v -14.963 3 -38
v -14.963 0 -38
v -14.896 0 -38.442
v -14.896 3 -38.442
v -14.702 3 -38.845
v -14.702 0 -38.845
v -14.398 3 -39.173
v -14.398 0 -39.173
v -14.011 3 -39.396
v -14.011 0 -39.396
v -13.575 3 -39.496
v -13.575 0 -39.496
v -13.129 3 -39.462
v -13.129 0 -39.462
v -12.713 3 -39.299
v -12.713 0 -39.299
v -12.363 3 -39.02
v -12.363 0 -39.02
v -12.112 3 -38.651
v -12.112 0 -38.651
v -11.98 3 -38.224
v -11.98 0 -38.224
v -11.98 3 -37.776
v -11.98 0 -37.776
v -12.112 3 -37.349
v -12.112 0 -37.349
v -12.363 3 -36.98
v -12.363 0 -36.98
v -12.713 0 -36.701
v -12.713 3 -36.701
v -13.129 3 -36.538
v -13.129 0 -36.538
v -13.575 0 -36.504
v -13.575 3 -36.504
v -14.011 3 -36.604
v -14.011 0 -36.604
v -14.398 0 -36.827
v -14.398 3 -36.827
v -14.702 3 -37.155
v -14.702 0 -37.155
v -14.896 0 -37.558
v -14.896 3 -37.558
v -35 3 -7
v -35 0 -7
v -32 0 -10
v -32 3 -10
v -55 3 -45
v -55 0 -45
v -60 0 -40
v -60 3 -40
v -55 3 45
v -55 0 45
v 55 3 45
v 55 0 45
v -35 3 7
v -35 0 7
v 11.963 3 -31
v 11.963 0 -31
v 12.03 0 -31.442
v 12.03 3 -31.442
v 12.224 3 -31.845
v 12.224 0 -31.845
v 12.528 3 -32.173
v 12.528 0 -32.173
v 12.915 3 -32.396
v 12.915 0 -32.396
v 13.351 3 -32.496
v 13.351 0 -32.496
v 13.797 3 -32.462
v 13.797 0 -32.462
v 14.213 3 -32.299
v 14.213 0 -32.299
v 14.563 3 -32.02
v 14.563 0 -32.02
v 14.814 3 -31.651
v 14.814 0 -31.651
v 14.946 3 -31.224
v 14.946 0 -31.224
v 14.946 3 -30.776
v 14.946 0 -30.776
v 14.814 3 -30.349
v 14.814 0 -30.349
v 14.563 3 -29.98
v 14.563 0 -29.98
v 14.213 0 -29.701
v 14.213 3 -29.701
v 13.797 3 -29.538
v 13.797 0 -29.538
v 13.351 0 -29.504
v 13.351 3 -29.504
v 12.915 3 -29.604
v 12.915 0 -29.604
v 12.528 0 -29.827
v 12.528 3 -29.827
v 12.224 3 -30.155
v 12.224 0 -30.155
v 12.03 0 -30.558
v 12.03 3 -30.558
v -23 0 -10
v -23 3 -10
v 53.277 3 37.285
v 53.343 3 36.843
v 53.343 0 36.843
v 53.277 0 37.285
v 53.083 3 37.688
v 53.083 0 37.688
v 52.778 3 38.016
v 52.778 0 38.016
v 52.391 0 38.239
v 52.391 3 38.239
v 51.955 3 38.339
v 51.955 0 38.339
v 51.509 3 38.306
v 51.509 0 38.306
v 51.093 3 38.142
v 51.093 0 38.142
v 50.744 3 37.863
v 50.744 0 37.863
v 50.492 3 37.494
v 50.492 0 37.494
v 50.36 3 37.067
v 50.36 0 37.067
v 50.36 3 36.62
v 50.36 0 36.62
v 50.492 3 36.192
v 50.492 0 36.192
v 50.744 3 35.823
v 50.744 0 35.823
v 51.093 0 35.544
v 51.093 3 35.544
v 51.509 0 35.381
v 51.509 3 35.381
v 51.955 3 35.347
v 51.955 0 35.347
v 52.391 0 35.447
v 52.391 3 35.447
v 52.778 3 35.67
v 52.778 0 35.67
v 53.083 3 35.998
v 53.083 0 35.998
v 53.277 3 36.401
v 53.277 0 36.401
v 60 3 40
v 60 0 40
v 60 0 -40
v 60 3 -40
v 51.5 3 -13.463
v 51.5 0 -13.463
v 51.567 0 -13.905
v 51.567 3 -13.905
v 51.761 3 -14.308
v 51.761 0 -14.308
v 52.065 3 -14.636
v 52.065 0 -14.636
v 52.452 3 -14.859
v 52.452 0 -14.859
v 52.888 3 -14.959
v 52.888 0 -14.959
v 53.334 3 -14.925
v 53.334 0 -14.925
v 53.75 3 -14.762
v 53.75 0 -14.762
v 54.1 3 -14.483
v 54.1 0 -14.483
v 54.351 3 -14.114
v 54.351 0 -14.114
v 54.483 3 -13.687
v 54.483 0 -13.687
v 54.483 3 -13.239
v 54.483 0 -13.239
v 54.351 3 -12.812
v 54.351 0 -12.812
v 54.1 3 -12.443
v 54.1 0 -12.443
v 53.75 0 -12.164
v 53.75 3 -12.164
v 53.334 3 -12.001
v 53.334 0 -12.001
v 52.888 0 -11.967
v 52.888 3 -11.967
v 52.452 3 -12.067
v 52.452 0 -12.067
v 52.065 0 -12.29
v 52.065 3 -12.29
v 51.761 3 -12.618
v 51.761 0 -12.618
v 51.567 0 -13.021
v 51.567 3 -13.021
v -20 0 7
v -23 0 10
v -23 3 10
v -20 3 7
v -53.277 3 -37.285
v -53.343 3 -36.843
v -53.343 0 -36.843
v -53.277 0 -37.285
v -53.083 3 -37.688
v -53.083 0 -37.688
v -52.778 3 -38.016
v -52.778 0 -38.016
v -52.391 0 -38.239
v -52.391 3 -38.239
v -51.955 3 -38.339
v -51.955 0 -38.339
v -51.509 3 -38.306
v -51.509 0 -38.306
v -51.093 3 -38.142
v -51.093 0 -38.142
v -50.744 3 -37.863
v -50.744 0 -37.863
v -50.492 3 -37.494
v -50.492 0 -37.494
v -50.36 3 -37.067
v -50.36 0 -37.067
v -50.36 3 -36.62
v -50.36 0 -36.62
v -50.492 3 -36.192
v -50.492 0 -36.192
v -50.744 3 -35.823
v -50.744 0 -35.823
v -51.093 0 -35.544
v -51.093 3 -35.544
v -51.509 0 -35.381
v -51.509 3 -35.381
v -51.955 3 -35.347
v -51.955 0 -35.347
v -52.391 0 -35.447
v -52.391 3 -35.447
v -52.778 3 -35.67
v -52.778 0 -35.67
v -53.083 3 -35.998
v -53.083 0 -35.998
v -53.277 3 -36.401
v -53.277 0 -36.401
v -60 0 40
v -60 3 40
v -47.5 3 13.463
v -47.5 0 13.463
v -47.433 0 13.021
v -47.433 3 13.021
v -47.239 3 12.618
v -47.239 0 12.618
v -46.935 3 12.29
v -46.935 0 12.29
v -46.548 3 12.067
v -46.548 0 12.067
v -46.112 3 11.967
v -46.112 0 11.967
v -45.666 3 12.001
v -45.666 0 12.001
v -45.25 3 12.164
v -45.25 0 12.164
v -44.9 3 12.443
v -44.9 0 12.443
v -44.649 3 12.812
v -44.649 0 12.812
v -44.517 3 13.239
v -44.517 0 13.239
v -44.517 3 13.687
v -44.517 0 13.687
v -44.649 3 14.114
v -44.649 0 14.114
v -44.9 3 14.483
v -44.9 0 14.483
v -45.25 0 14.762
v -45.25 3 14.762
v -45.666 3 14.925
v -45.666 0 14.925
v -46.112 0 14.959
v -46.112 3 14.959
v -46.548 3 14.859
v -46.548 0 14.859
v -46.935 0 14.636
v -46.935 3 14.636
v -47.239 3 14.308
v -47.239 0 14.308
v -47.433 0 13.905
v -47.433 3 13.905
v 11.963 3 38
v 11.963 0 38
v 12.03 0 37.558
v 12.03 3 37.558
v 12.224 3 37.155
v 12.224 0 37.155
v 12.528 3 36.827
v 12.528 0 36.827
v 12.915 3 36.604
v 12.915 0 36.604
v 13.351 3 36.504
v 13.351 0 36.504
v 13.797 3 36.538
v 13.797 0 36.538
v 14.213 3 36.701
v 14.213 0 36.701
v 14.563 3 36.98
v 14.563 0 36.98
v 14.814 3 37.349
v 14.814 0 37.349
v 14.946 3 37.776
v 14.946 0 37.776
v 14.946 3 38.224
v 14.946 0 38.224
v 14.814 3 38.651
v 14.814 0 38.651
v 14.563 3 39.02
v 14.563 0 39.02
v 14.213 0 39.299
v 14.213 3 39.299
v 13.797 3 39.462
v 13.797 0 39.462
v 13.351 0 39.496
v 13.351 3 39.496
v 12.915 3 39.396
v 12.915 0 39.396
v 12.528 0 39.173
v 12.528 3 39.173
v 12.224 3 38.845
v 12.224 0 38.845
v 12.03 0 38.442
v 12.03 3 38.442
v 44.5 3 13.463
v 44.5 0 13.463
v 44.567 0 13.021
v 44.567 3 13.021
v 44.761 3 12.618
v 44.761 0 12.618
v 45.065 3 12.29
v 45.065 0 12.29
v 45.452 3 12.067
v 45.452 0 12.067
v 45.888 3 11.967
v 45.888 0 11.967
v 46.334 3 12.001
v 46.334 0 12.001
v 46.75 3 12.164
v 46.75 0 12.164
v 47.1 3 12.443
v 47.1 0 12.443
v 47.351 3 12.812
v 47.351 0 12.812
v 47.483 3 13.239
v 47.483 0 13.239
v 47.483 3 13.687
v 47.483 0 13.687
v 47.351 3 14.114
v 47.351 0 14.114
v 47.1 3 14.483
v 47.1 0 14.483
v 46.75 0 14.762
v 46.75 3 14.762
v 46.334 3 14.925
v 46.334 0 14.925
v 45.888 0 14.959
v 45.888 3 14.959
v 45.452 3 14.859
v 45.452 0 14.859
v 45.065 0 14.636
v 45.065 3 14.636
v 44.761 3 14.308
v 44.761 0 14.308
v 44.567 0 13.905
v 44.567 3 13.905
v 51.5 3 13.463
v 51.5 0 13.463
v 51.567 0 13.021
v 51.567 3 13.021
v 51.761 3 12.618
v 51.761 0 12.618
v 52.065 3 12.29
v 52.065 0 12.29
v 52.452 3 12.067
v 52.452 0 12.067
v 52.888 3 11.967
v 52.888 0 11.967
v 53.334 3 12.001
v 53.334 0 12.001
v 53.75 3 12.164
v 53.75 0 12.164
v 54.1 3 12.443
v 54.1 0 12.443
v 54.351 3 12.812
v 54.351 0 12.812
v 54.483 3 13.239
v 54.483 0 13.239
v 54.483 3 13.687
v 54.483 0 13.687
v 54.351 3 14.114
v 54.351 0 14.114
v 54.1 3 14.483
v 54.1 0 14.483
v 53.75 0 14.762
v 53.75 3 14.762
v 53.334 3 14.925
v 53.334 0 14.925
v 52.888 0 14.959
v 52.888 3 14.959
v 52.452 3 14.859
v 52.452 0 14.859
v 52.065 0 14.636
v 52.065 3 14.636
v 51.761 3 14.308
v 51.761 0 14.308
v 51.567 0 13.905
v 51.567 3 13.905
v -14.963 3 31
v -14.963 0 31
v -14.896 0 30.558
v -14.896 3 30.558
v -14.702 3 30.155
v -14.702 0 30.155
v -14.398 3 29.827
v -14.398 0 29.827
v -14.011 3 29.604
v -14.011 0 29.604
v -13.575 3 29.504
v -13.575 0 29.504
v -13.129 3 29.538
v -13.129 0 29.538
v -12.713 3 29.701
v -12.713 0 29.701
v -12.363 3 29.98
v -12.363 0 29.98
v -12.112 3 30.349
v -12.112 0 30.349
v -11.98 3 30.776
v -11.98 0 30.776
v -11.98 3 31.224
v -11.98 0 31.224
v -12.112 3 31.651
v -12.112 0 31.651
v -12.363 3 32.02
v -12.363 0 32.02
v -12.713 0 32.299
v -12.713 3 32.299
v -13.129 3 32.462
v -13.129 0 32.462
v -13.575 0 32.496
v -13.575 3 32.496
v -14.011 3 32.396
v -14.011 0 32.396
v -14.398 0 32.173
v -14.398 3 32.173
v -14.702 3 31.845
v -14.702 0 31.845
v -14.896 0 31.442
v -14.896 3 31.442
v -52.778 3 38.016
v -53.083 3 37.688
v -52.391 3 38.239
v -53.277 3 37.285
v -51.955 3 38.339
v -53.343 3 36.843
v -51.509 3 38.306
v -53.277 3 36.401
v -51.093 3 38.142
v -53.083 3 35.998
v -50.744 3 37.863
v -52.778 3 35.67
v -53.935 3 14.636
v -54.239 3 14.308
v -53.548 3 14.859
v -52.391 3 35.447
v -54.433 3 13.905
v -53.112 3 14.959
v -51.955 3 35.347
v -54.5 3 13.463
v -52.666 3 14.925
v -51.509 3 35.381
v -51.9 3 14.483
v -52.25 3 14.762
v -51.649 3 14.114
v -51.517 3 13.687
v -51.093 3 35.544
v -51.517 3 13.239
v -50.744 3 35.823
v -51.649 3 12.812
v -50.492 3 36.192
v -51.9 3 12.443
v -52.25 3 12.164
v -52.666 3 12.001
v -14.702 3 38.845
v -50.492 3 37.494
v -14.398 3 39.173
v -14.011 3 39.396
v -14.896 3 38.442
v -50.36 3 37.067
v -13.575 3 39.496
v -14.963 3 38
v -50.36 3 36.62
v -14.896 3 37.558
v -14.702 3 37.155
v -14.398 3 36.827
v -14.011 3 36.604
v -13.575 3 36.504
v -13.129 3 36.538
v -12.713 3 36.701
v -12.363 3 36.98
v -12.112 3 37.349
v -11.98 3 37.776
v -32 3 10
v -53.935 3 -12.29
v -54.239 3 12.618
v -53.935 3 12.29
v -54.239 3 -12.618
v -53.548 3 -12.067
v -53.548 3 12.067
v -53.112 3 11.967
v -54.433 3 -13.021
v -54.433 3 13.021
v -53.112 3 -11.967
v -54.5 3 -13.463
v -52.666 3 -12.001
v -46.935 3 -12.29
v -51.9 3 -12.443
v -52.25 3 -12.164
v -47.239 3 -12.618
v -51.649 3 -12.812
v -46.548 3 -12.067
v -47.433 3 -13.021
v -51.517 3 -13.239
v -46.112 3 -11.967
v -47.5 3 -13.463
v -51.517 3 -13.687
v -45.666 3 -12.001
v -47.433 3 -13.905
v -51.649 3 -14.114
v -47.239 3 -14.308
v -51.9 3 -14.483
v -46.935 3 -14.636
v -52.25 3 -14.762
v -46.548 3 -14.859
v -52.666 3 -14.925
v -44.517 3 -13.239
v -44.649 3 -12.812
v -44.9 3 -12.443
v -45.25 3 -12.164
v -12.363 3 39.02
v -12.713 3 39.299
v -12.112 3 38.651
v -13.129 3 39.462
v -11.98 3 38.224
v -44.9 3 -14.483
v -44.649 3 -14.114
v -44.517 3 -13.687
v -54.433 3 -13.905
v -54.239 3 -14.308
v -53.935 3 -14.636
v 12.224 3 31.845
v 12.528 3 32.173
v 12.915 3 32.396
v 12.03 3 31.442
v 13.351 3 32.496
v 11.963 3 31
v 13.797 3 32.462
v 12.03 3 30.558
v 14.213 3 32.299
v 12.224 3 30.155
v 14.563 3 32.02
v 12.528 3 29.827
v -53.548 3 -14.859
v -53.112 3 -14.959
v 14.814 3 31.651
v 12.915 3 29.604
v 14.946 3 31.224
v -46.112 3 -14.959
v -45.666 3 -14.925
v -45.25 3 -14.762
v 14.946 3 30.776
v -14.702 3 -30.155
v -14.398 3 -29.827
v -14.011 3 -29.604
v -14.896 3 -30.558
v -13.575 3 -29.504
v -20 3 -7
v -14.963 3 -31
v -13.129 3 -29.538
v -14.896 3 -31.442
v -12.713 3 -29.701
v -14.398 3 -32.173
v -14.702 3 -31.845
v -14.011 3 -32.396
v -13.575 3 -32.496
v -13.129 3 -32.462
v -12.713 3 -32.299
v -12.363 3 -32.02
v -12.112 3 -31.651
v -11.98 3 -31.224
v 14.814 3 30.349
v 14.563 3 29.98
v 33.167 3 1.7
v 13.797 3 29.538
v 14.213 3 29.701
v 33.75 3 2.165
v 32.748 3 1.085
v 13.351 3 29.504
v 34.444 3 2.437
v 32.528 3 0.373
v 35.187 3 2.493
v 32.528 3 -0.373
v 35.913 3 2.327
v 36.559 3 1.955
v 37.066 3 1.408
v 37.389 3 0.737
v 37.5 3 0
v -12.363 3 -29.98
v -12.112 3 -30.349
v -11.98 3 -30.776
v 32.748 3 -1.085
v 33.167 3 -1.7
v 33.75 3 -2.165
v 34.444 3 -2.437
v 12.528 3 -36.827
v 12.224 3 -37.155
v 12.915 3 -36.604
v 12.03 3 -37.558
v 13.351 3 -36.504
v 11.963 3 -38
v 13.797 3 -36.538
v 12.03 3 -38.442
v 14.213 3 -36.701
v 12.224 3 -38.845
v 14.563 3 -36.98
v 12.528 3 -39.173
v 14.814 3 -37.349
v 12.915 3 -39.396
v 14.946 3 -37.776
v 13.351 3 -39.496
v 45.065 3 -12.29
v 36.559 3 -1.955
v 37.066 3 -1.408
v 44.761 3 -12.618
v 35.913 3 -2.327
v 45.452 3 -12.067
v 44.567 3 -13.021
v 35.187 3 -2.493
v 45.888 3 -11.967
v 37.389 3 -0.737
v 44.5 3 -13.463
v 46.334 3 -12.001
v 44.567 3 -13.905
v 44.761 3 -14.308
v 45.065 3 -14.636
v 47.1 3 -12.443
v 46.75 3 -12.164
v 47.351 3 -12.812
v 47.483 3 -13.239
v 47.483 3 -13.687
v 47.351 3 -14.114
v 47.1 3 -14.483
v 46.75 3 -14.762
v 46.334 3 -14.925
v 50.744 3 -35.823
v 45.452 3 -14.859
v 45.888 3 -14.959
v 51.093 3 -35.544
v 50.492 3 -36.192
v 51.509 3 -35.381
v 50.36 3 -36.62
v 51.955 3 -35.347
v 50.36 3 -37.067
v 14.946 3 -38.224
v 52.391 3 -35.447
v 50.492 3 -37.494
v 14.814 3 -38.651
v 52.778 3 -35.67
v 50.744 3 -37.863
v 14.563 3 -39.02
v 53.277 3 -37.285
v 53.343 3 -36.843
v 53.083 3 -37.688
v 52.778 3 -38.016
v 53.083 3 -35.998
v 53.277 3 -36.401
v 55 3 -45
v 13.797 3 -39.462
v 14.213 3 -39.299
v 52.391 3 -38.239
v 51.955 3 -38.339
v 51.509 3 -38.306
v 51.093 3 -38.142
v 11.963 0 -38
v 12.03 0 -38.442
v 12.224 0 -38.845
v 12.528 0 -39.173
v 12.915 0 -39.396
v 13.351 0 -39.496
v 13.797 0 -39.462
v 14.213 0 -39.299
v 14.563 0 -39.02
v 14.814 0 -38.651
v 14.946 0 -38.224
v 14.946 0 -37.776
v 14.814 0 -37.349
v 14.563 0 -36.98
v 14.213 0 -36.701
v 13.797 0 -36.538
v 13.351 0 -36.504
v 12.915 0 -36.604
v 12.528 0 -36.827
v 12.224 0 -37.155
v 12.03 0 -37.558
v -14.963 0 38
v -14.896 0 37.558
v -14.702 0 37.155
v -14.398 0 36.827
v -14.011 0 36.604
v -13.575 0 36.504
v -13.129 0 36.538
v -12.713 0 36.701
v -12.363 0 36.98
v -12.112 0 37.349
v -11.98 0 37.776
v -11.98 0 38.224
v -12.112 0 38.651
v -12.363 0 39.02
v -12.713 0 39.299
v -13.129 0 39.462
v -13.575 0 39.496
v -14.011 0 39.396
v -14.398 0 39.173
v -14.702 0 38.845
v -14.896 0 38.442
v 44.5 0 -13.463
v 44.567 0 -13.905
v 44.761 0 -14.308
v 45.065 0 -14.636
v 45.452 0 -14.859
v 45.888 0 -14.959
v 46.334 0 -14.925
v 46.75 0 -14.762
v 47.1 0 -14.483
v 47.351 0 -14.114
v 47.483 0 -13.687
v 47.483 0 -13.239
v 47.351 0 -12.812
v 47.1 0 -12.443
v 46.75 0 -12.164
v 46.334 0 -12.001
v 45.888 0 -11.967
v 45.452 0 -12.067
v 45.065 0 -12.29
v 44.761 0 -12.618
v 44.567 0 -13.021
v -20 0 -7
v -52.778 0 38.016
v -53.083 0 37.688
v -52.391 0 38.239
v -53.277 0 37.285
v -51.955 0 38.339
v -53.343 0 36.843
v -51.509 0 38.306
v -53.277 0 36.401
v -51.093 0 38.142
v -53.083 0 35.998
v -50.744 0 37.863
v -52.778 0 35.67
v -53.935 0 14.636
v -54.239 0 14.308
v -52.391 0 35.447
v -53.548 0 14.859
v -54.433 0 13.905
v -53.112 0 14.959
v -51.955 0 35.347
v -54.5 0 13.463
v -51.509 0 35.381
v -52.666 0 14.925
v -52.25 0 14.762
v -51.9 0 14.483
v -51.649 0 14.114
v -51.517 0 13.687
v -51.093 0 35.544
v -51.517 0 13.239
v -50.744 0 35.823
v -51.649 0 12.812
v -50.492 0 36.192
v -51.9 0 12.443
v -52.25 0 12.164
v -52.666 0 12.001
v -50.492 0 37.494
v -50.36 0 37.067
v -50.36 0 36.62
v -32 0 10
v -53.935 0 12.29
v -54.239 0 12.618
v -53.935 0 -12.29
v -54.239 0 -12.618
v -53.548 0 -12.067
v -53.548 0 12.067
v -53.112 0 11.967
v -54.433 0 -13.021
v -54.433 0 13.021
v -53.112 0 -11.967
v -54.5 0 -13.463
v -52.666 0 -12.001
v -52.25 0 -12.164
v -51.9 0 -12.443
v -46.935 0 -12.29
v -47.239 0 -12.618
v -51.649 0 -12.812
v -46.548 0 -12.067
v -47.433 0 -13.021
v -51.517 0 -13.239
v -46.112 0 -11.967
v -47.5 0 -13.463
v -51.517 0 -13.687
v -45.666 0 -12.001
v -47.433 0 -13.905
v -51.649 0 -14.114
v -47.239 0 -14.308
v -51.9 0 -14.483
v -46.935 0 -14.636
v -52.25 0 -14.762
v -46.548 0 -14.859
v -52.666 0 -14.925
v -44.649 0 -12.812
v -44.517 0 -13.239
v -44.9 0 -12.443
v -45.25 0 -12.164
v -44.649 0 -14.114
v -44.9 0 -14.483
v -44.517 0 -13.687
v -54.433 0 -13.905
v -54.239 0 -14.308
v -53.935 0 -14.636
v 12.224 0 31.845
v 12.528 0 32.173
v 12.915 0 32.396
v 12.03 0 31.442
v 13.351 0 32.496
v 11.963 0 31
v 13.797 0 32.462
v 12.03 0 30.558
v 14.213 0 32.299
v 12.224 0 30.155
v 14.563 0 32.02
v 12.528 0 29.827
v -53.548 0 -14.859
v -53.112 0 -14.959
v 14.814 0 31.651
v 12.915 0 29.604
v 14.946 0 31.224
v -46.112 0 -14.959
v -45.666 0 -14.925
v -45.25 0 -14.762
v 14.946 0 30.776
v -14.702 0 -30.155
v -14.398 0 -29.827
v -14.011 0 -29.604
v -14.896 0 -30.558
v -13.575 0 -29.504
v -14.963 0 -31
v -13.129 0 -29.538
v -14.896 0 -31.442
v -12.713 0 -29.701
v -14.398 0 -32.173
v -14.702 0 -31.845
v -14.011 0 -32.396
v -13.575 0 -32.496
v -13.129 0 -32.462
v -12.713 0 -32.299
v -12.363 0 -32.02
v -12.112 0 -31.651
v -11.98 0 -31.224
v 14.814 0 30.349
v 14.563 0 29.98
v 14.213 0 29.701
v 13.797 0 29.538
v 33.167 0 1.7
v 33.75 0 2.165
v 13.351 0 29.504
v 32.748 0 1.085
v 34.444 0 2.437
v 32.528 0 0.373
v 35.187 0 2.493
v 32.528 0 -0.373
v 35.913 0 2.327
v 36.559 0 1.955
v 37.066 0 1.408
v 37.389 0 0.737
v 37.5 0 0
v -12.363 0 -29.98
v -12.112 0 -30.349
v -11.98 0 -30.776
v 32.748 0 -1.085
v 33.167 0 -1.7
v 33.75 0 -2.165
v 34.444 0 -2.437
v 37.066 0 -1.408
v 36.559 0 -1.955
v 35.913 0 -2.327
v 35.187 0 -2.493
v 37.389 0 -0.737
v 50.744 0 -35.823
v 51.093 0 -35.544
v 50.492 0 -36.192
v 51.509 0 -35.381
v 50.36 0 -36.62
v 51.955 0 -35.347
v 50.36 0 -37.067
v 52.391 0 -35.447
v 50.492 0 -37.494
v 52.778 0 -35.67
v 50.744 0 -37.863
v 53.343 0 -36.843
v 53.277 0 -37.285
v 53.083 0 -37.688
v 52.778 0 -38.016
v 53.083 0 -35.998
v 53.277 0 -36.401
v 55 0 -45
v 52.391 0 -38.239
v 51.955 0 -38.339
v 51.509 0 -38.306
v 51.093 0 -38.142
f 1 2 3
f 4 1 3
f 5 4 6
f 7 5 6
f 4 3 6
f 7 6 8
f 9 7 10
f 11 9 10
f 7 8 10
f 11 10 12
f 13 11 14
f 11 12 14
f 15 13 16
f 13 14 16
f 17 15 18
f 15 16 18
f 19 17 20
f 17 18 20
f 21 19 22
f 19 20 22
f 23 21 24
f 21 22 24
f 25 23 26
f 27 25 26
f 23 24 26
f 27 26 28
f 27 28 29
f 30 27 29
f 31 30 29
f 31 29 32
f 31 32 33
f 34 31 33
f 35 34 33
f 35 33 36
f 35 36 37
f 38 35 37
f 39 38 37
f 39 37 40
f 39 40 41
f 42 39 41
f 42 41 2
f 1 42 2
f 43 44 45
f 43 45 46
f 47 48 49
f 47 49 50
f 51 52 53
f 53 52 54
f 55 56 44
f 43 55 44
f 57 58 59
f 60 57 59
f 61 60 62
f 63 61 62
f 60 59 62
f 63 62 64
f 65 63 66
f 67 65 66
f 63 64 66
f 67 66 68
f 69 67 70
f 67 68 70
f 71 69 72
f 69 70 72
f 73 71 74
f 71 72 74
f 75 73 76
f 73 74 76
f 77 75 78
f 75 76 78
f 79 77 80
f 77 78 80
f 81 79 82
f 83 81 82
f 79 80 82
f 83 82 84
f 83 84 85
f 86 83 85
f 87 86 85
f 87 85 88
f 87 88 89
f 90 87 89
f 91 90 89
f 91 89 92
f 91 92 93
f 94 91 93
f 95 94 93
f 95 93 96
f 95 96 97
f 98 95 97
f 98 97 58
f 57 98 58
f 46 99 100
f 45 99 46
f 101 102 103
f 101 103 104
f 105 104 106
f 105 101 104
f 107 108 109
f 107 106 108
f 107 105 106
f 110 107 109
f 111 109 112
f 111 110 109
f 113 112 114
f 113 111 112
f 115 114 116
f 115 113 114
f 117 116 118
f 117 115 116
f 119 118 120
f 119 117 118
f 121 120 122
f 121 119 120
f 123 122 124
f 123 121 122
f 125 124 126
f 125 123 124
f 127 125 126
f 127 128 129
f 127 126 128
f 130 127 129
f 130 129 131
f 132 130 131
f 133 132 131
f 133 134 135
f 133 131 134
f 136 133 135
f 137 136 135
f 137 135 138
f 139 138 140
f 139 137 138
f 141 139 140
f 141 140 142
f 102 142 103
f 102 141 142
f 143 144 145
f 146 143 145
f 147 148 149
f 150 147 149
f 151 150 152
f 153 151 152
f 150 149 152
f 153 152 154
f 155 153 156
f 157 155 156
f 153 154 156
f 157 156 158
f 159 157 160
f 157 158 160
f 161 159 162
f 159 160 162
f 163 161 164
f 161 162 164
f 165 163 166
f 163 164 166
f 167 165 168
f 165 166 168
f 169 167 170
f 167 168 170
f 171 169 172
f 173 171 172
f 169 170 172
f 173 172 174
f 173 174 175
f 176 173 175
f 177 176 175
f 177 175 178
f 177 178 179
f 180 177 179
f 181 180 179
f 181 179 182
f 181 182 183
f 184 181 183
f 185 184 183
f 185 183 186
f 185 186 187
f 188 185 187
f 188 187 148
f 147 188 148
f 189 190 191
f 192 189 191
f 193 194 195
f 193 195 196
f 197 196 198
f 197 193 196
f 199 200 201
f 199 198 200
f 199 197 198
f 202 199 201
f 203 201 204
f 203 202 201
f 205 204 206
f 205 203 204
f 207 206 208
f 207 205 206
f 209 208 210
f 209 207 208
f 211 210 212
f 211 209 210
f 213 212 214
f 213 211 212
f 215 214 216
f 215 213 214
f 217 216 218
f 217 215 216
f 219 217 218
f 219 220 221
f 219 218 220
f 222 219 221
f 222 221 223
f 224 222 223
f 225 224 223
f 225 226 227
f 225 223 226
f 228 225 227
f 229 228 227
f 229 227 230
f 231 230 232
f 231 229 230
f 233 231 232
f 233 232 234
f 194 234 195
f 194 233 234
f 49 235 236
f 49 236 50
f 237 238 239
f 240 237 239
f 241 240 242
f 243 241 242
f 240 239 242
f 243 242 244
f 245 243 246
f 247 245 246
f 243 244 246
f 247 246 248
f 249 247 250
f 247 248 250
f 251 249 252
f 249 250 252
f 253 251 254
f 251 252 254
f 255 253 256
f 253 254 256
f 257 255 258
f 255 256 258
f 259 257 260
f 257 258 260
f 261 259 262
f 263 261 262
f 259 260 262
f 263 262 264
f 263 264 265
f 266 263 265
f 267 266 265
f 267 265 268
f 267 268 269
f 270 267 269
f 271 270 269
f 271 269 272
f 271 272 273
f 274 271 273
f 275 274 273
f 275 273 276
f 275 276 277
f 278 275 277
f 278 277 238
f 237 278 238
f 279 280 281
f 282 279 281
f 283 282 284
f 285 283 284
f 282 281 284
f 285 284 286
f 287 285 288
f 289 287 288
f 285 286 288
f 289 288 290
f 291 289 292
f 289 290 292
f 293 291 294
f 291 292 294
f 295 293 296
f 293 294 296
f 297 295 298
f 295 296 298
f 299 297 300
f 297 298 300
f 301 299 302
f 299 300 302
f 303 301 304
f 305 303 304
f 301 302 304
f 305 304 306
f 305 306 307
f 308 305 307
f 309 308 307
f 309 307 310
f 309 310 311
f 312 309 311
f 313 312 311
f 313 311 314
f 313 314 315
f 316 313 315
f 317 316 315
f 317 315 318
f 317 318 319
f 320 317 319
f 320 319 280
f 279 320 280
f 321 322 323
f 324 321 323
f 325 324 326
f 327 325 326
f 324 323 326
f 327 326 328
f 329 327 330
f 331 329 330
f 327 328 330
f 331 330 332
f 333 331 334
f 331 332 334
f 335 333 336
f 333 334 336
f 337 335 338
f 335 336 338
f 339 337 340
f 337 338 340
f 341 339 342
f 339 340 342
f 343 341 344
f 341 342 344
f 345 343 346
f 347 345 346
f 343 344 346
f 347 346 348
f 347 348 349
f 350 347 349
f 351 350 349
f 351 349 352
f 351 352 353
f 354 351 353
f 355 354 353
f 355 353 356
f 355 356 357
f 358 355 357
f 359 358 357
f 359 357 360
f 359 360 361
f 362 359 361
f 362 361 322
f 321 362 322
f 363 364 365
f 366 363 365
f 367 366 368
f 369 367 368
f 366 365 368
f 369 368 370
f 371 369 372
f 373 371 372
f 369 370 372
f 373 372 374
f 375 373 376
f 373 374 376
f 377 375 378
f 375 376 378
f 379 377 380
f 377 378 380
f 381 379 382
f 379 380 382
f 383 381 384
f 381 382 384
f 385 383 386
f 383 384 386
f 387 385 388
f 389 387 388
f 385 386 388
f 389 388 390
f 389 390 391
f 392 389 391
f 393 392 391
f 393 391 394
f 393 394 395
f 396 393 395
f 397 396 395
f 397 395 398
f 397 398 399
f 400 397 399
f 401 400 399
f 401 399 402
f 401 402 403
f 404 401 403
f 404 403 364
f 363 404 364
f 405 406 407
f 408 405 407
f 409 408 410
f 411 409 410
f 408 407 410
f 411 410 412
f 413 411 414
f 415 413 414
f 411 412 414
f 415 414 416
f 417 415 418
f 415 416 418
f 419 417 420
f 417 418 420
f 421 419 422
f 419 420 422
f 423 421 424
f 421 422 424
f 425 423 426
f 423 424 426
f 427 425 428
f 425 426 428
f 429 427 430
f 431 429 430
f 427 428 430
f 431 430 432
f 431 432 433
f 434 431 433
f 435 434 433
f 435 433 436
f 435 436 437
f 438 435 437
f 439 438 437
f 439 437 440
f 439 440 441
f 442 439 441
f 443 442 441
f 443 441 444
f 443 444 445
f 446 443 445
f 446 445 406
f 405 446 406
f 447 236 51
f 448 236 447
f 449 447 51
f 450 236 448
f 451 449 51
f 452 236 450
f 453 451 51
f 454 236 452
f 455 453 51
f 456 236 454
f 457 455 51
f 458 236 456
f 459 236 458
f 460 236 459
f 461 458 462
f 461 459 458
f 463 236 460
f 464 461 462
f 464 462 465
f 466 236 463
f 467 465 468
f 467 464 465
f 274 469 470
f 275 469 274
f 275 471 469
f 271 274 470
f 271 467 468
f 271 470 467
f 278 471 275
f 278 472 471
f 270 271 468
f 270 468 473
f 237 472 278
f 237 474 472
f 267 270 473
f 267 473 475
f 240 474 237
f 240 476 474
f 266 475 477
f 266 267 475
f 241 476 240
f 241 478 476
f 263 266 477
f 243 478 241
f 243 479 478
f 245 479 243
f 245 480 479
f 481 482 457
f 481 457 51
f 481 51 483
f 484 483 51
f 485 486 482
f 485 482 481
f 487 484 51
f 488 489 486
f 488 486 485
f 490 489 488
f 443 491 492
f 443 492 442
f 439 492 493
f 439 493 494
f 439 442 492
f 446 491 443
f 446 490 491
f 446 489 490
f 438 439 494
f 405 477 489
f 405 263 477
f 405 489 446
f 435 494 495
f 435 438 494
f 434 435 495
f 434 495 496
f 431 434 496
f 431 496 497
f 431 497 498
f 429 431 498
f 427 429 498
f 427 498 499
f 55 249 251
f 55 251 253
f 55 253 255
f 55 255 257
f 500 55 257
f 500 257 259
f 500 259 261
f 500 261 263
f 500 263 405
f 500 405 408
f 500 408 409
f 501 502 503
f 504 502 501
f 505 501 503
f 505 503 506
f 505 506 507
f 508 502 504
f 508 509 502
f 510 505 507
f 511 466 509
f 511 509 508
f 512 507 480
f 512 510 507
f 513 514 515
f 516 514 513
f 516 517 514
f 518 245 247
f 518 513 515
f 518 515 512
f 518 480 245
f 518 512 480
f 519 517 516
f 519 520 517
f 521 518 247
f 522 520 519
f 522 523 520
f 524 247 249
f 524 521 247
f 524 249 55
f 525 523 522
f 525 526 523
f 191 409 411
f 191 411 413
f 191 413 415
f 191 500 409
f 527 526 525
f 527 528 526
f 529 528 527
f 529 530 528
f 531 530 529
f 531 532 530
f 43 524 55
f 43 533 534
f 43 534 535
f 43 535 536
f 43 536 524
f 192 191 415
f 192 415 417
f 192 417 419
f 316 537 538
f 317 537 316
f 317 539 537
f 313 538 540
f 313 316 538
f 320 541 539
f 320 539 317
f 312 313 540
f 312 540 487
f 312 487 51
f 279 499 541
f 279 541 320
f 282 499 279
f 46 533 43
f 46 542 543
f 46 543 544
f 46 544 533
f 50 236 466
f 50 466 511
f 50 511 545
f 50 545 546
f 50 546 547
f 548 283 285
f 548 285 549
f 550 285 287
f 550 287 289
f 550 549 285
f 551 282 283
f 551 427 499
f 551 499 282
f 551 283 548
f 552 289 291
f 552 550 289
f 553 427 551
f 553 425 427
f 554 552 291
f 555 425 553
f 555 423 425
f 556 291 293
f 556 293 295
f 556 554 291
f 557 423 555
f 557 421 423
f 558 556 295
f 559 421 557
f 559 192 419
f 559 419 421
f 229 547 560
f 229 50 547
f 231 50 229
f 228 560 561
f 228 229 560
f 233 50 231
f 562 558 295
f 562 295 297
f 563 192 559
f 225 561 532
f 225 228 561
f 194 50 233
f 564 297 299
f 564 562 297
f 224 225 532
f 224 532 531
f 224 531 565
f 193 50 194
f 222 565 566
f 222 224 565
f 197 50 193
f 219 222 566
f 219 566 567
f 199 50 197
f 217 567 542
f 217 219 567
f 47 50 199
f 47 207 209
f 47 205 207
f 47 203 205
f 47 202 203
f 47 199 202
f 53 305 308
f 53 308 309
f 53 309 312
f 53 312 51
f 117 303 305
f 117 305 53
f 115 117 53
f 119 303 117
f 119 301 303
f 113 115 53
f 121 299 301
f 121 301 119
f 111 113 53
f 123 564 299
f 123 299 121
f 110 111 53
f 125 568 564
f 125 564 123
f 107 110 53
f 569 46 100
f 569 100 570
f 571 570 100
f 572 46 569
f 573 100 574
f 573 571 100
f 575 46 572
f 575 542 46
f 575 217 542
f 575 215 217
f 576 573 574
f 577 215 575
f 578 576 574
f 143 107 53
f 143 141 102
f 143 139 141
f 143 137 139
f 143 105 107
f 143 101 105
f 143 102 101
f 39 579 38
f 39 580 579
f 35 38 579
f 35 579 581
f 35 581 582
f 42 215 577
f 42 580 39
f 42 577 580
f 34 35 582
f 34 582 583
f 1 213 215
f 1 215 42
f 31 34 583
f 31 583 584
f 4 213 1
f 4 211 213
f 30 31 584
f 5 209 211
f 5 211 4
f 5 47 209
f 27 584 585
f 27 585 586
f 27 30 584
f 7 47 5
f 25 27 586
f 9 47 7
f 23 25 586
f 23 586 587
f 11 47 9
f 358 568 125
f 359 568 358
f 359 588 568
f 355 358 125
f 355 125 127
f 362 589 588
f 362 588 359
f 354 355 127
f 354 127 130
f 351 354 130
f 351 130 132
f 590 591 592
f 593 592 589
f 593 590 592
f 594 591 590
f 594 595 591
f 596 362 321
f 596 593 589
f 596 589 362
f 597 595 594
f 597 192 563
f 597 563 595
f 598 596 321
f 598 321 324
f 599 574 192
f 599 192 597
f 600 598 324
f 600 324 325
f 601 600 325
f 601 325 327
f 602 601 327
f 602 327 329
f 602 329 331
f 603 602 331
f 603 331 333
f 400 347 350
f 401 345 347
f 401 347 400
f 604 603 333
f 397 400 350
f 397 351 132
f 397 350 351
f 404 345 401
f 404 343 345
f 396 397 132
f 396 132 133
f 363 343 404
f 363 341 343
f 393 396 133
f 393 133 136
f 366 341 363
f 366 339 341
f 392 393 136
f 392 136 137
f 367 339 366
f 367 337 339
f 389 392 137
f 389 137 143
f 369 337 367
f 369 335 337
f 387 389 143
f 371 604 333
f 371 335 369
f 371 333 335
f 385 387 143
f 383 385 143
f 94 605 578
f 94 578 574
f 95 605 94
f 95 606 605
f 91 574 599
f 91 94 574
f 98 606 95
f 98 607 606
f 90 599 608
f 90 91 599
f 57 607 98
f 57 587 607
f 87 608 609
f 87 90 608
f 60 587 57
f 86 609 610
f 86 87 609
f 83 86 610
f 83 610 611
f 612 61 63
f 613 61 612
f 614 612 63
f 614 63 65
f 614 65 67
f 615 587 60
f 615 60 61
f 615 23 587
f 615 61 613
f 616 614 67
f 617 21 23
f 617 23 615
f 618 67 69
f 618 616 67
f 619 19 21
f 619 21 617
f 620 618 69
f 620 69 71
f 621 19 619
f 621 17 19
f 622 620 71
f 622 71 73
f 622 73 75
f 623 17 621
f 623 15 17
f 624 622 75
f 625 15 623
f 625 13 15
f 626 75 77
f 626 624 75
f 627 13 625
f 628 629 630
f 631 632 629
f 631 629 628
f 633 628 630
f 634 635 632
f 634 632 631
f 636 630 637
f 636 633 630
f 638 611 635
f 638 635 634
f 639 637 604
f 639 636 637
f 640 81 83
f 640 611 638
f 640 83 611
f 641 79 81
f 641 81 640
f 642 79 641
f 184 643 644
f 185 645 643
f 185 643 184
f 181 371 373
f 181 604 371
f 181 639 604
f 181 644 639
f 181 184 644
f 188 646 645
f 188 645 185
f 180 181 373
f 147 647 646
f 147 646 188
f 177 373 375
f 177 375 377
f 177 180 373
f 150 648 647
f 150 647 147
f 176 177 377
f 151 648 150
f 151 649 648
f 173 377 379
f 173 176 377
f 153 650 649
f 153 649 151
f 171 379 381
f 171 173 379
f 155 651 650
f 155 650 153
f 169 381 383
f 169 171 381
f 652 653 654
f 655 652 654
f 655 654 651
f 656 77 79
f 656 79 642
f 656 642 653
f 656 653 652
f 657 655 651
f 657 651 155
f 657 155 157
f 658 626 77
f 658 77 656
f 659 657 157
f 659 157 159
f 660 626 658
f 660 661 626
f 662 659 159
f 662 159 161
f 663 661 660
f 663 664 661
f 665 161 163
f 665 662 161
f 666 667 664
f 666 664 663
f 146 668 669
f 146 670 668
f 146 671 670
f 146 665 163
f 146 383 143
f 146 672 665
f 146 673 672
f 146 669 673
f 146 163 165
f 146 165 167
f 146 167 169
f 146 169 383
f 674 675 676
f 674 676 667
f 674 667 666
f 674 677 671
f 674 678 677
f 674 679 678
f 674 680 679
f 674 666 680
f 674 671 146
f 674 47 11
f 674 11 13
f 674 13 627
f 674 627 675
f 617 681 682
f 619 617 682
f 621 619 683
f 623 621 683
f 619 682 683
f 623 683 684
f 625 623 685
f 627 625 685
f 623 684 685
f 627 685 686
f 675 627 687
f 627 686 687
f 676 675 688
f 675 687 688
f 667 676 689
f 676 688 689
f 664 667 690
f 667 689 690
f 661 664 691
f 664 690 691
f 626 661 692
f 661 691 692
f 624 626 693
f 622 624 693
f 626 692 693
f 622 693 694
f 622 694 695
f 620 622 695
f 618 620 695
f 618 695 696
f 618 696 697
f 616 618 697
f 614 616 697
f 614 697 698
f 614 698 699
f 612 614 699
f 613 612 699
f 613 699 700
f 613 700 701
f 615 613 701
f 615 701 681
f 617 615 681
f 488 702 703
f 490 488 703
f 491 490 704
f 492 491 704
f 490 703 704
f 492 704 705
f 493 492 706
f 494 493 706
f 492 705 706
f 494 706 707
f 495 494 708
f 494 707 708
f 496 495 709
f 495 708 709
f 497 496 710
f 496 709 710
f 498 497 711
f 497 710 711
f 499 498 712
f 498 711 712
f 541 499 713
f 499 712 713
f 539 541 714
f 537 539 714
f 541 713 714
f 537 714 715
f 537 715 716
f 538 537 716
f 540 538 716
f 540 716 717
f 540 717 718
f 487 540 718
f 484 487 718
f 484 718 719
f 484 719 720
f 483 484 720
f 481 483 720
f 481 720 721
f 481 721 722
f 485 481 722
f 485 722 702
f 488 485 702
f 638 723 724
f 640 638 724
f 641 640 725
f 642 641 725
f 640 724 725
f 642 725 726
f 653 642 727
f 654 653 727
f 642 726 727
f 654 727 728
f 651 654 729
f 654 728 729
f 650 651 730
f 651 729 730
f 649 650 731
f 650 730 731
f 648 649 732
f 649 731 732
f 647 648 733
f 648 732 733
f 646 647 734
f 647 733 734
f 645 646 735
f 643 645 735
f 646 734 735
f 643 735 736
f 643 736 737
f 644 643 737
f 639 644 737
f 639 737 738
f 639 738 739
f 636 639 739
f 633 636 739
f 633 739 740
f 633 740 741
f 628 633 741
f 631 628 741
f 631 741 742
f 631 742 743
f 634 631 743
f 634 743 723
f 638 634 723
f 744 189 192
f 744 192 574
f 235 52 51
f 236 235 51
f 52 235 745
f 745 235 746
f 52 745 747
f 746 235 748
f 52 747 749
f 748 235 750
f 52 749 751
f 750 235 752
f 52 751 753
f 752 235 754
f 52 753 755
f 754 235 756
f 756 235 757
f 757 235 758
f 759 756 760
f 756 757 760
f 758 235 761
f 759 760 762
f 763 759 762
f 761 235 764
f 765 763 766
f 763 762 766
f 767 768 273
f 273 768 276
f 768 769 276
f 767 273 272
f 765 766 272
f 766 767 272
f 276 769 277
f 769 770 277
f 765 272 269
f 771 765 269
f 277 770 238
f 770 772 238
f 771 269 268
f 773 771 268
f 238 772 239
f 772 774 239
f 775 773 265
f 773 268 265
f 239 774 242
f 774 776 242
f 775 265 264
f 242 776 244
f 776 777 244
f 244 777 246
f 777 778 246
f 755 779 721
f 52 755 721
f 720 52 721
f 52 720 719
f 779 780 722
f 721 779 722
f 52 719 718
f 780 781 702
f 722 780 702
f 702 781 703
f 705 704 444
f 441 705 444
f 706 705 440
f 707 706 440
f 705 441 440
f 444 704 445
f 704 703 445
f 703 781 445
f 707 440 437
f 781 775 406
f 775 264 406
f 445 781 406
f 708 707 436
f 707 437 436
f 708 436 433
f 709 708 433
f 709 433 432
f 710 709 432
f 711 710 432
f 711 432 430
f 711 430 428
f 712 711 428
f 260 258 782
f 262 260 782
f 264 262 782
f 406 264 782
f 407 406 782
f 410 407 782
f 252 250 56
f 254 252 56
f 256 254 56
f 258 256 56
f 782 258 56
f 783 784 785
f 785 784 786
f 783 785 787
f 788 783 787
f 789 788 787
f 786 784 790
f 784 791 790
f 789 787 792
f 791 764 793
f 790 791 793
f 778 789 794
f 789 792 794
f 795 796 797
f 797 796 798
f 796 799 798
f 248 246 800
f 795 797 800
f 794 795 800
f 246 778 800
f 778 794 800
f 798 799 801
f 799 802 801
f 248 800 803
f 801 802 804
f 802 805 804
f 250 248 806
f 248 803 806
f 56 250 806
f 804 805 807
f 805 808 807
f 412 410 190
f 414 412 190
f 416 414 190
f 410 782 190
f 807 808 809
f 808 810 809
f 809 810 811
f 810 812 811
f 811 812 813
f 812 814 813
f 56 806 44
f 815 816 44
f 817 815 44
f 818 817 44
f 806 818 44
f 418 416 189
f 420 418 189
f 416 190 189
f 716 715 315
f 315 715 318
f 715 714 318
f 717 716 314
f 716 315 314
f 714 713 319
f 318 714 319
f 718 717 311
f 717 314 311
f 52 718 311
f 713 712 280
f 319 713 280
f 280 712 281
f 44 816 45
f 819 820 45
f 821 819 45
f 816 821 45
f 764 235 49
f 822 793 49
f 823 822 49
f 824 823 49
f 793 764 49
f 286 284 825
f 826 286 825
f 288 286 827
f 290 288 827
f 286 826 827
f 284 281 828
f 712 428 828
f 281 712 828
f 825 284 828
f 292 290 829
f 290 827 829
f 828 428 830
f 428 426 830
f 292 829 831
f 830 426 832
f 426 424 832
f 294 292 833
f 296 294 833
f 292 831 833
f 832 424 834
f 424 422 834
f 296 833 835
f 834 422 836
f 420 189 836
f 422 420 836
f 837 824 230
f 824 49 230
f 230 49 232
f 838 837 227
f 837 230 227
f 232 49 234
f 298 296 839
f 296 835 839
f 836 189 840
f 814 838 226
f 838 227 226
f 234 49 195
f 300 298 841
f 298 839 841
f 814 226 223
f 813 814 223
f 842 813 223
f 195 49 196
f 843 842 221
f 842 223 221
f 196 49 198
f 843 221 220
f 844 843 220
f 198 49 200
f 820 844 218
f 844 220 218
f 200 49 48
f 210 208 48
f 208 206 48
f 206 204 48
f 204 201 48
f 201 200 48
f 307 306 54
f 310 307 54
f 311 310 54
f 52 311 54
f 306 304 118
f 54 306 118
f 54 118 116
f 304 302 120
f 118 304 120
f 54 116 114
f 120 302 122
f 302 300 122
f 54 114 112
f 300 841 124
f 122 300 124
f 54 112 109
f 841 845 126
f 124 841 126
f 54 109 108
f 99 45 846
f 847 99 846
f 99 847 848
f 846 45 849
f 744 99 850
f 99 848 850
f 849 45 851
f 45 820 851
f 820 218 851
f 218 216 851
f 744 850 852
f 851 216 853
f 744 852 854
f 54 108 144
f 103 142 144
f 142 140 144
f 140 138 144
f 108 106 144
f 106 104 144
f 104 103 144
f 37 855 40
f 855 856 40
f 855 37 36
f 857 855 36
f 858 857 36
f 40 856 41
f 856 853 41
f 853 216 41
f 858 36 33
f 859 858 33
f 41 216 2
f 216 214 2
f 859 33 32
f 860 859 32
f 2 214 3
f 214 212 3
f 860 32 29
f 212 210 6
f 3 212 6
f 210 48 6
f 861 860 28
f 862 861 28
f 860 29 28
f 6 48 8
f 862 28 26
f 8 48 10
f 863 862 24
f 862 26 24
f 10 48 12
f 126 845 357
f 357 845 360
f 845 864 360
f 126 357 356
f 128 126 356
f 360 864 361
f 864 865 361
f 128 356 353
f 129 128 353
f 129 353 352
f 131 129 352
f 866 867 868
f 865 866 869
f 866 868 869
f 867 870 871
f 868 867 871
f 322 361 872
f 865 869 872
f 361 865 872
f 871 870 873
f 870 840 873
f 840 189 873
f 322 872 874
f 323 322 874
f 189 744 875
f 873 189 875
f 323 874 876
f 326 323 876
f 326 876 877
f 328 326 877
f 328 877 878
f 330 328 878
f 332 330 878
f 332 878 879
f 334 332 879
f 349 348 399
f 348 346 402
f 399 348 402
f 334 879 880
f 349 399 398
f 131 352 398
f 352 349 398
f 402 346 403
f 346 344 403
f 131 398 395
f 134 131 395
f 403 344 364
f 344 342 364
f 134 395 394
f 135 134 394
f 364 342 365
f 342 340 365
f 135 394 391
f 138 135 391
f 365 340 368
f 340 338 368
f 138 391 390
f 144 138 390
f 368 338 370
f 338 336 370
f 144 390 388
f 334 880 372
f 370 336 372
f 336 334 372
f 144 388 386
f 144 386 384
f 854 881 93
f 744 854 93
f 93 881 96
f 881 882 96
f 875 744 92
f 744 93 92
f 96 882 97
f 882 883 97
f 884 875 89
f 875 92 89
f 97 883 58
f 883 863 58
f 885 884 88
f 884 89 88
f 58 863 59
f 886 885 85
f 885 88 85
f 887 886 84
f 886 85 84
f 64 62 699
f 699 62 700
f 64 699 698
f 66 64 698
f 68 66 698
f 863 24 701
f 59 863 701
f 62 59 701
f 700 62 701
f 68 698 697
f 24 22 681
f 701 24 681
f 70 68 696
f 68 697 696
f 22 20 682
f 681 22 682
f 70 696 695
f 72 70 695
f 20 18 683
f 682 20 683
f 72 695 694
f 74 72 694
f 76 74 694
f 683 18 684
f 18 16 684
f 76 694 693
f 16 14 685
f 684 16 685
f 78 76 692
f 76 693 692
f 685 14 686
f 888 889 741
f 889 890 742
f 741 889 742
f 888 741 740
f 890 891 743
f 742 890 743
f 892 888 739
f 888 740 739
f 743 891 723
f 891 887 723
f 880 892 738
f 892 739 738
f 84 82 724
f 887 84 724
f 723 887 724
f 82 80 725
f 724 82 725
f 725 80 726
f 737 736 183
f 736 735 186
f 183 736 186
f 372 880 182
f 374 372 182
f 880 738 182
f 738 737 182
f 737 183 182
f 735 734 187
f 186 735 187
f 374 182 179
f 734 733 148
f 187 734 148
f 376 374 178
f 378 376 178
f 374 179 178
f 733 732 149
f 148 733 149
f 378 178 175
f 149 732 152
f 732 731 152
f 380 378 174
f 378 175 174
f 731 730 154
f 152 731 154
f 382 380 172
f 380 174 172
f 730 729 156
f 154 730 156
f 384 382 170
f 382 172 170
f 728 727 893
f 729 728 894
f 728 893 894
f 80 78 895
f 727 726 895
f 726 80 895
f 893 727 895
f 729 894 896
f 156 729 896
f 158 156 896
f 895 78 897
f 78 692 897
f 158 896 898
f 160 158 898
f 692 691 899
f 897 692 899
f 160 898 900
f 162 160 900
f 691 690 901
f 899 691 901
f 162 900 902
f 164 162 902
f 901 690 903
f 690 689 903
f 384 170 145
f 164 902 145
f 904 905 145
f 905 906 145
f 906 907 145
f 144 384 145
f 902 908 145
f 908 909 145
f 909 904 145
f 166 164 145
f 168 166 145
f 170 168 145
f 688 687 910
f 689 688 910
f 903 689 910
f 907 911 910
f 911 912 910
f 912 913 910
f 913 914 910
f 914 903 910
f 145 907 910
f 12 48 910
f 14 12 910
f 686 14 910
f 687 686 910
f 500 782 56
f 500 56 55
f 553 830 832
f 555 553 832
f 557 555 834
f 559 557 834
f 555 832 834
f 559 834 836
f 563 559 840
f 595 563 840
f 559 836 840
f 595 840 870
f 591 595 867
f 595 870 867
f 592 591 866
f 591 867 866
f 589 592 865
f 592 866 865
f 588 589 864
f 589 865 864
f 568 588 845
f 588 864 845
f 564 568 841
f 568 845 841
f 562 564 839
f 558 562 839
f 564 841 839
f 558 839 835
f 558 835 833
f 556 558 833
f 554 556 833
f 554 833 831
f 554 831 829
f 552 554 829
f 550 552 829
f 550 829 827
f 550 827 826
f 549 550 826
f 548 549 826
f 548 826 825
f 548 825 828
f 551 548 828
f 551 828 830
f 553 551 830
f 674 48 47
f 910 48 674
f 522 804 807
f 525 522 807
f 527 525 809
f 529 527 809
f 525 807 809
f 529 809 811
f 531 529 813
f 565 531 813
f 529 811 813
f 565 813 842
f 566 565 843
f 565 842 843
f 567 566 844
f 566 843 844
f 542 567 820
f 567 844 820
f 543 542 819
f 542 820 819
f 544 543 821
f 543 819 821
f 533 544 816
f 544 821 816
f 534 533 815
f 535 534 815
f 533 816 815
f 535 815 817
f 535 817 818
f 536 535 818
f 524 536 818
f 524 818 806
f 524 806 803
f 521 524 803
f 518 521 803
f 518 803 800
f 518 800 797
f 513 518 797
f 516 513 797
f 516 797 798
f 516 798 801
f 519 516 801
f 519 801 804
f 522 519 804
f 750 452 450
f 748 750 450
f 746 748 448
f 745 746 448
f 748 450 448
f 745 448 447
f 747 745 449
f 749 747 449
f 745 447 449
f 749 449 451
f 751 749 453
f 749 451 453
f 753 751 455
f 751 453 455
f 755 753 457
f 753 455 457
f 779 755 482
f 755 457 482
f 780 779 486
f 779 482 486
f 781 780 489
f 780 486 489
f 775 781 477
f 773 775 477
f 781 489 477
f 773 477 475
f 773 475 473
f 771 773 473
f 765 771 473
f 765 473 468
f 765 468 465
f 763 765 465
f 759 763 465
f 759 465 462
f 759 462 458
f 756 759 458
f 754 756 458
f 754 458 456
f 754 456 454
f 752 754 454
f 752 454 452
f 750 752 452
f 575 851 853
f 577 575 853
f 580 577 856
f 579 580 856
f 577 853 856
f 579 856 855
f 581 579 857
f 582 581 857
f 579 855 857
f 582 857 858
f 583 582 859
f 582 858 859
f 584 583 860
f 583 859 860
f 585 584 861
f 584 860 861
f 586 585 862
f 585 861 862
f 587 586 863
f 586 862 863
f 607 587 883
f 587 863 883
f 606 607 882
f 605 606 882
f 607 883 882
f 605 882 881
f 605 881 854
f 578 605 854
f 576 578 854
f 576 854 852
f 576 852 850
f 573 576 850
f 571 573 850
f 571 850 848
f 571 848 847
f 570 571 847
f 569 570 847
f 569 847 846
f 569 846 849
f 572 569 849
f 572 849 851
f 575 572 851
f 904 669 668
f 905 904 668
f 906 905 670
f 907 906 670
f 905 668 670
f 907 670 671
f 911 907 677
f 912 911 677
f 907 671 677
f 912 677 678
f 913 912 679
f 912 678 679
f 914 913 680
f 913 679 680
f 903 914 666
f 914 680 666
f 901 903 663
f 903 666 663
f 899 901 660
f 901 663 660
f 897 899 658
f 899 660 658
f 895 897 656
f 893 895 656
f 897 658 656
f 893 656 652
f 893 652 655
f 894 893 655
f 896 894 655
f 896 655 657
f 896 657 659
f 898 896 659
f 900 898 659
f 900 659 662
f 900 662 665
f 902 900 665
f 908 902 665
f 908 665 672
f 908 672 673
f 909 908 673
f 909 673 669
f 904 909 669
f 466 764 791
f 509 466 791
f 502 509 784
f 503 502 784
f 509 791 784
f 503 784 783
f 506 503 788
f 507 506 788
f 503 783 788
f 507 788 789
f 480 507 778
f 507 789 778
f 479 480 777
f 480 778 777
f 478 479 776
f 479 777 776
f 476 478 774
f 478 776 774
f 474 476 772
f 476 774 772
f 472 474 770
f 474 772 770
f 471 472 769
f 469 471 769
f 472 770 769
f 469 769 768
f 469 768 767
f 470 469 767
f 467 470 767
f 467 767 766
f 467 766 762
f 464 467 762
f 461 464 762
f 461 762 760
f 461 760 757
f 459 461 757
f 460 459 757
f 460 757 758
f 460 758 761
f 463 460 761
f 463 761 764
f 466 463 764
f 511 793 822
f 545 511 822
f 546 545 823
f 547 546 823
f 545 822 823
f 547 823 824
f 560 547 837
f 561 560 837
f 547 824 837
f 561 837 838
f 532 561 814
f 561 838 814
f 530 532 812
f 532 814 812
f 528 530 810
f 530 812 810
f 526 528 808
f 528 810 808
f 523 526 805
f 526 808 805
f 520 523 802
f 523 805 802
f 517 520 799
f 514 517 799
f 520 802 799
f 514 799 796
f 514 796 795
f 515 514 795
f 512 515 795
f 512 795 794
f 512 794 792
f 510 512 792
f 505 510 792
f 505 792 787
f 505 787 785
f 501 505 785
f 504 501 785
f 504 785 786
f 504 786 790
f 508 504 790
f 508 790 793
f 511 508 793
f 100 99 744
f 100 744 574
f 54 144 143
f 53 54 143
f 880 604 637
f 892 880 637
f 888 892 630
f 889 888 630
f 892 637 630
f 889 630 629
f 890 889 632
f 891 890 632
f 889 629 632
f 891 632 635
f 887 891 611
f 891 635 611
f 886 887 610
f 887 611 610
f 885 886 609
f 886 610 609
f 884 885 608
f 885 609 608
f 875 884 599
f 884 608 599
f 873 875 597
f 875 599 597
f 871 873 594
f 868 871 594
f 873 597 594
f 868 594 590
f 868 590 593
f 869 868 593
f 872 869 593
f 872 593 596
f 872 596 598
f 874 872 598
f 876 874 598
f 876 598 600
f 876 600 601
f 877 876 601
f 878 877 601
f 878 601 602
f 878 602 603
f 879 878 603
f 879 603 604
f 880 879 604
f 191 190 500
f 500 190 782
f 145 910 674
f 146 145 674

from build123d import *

# Parameters (mm, degrees)
SKETCH1_W                            = 120
SKETCH1_H                            = 90
BOSS_EXTRUDE1_DEPTH                  = 3
CHAMFER1_SIZE                        = 5
F_3_0_3_DIAMETER_HOLE2_D             = 3
MIRROR1_AT_THE_SECOND_PLANE_COPY_1_D = 3
F_3_0_3_DIAMETER_HOLE3_D             = 3
F_5_0_5_DIAMETER_HOLE1_D             = 5
SKETCH11_W                           = 15
SKETCH11_H                           = 20
CUT_EXTRUDE1_DEPTH                   = 76.059976019
CHAMFER2_SIZE                        = 3


with BuildPart() as part:
    # Sketch1 → Boss-Extrude1 (new body)
    with BuildSketch(Plane(origin=(0, 0, 0), x_dir=(1, 0, 0), z_dir=(0, 1, 0))):
        Rectangle(SKETCH1_W, SKETCH1_H)
    extrude(amount=BOSS_EXTRUDE1_DEPTH)

    # Chamfer1
    chamfer1_edges = [part.edges().sort_by_distance(p)[0] for p in [
        (60, 1.5, 45),
        (-60, 1.5, 45),
        (-60, 1.5, -45),
        (60, 1.5, -45),
    ]]
    chamfer(chamfer1_edges, length=CHAMFER1_SIZE)

    # Ø3.0 (3) Diameter Hole2 (through all)
    with Locations(Plane.XZ):
        with Locations((-51.843145751, 36.843145751)):
            f_3_0_3_diameter_hole2 = Hole(F_3_0_3_DIAMETER_HOLE2_D / 2)

    # Mirror1: Ø3.0 (3) Diameter Hole2 across plane
    add(f_3_0_3_diameter_hole2.mirror(Plane.XY), mode=Mode.SUBTRACT)

    # Mirror1 at the second plane: Ø3.0 (3) Diameter Hole2 across plane
    add(f_3_0_3_diameter_hole2.mirror(Plane(origin=(0, 0, 0), x_dir=(0, 0, 1), z_dir=(1, 0, 0))), mode=Mode.SUBTRACT)

    # Mirror1 at the second plane copy 1 (through all)
    with Locations(Plane(origin=(0, 0, 0), x_dir=(-1, 0, 0), z_dir=(0, -1, 0))):
        with Locations((-51.843145751, 36.843145751)):
            Hole(MIRROR1_AT_THE_SECOND_PLANE_COPY_1_D / 2)

    # Ø3.0 (3) Diameter Hole3 (through all)
    with Locations(Plane(origin=(0, 3, 0), x_dir=(1, 0, 0), z_dir=(0, 1, 0))):
        with Locations((46, -13.462985276), (53, -13.462985276), (46, 13.462985276), (53, 13.462985276), (13.462985276, -31), (13.462985276, -38), (-13.462985276, -38), (-13.462985276, -31), (-46, -13.462985276), (-53, -13.462985276), (-46, 13.462985276), (-53, 13.462985276), (13.462985276, 31), (13.462985276, 38), (-13.462985276, 31), (-13.462985276, 38)):
            Hole(F_3_0_3_DIAMETER_HOLE3_D / 2)

    # Ø5.0 (5) Diameter Hole1 (through all)
    with Locations(Plane(origin=(0, 0, 0), x_dir=(-1, 0, 0), z_dir=(0, -1, 0))):
        with Locations((-35, 0)):
            Hole(F_5_0_5_DIAMETER_HOLE1_D / 2)

    # Sketch11 → Cut-Extrude1 (cut, through all)
    with BuildSketch(Plane(origin=(0, 0, 0), x_dir=(-1, 0, 0), z_dir=(0, -1, 0))):
        with Locations((27.5, 0)):
            Rectangle(SKETCH11_W, SKETCH11_H)
    extrude(amount=-CUT_EXTRUDE1_DEPTH, mode=Mode.SUBTRACT)

    # Chamfer2
    chamfer2_edges = [part.edges().sort_by_distance(p)[0] for p in [
        (-35, 1.5, -10),
        (-35, 1.5, 10),
        (-20, 1.5, 10),
        (-20, 1.5, -10),
    ]]
    chamfer(chamfer2_edges, length=CHAMFER2_SIZE)


solid = part.part
